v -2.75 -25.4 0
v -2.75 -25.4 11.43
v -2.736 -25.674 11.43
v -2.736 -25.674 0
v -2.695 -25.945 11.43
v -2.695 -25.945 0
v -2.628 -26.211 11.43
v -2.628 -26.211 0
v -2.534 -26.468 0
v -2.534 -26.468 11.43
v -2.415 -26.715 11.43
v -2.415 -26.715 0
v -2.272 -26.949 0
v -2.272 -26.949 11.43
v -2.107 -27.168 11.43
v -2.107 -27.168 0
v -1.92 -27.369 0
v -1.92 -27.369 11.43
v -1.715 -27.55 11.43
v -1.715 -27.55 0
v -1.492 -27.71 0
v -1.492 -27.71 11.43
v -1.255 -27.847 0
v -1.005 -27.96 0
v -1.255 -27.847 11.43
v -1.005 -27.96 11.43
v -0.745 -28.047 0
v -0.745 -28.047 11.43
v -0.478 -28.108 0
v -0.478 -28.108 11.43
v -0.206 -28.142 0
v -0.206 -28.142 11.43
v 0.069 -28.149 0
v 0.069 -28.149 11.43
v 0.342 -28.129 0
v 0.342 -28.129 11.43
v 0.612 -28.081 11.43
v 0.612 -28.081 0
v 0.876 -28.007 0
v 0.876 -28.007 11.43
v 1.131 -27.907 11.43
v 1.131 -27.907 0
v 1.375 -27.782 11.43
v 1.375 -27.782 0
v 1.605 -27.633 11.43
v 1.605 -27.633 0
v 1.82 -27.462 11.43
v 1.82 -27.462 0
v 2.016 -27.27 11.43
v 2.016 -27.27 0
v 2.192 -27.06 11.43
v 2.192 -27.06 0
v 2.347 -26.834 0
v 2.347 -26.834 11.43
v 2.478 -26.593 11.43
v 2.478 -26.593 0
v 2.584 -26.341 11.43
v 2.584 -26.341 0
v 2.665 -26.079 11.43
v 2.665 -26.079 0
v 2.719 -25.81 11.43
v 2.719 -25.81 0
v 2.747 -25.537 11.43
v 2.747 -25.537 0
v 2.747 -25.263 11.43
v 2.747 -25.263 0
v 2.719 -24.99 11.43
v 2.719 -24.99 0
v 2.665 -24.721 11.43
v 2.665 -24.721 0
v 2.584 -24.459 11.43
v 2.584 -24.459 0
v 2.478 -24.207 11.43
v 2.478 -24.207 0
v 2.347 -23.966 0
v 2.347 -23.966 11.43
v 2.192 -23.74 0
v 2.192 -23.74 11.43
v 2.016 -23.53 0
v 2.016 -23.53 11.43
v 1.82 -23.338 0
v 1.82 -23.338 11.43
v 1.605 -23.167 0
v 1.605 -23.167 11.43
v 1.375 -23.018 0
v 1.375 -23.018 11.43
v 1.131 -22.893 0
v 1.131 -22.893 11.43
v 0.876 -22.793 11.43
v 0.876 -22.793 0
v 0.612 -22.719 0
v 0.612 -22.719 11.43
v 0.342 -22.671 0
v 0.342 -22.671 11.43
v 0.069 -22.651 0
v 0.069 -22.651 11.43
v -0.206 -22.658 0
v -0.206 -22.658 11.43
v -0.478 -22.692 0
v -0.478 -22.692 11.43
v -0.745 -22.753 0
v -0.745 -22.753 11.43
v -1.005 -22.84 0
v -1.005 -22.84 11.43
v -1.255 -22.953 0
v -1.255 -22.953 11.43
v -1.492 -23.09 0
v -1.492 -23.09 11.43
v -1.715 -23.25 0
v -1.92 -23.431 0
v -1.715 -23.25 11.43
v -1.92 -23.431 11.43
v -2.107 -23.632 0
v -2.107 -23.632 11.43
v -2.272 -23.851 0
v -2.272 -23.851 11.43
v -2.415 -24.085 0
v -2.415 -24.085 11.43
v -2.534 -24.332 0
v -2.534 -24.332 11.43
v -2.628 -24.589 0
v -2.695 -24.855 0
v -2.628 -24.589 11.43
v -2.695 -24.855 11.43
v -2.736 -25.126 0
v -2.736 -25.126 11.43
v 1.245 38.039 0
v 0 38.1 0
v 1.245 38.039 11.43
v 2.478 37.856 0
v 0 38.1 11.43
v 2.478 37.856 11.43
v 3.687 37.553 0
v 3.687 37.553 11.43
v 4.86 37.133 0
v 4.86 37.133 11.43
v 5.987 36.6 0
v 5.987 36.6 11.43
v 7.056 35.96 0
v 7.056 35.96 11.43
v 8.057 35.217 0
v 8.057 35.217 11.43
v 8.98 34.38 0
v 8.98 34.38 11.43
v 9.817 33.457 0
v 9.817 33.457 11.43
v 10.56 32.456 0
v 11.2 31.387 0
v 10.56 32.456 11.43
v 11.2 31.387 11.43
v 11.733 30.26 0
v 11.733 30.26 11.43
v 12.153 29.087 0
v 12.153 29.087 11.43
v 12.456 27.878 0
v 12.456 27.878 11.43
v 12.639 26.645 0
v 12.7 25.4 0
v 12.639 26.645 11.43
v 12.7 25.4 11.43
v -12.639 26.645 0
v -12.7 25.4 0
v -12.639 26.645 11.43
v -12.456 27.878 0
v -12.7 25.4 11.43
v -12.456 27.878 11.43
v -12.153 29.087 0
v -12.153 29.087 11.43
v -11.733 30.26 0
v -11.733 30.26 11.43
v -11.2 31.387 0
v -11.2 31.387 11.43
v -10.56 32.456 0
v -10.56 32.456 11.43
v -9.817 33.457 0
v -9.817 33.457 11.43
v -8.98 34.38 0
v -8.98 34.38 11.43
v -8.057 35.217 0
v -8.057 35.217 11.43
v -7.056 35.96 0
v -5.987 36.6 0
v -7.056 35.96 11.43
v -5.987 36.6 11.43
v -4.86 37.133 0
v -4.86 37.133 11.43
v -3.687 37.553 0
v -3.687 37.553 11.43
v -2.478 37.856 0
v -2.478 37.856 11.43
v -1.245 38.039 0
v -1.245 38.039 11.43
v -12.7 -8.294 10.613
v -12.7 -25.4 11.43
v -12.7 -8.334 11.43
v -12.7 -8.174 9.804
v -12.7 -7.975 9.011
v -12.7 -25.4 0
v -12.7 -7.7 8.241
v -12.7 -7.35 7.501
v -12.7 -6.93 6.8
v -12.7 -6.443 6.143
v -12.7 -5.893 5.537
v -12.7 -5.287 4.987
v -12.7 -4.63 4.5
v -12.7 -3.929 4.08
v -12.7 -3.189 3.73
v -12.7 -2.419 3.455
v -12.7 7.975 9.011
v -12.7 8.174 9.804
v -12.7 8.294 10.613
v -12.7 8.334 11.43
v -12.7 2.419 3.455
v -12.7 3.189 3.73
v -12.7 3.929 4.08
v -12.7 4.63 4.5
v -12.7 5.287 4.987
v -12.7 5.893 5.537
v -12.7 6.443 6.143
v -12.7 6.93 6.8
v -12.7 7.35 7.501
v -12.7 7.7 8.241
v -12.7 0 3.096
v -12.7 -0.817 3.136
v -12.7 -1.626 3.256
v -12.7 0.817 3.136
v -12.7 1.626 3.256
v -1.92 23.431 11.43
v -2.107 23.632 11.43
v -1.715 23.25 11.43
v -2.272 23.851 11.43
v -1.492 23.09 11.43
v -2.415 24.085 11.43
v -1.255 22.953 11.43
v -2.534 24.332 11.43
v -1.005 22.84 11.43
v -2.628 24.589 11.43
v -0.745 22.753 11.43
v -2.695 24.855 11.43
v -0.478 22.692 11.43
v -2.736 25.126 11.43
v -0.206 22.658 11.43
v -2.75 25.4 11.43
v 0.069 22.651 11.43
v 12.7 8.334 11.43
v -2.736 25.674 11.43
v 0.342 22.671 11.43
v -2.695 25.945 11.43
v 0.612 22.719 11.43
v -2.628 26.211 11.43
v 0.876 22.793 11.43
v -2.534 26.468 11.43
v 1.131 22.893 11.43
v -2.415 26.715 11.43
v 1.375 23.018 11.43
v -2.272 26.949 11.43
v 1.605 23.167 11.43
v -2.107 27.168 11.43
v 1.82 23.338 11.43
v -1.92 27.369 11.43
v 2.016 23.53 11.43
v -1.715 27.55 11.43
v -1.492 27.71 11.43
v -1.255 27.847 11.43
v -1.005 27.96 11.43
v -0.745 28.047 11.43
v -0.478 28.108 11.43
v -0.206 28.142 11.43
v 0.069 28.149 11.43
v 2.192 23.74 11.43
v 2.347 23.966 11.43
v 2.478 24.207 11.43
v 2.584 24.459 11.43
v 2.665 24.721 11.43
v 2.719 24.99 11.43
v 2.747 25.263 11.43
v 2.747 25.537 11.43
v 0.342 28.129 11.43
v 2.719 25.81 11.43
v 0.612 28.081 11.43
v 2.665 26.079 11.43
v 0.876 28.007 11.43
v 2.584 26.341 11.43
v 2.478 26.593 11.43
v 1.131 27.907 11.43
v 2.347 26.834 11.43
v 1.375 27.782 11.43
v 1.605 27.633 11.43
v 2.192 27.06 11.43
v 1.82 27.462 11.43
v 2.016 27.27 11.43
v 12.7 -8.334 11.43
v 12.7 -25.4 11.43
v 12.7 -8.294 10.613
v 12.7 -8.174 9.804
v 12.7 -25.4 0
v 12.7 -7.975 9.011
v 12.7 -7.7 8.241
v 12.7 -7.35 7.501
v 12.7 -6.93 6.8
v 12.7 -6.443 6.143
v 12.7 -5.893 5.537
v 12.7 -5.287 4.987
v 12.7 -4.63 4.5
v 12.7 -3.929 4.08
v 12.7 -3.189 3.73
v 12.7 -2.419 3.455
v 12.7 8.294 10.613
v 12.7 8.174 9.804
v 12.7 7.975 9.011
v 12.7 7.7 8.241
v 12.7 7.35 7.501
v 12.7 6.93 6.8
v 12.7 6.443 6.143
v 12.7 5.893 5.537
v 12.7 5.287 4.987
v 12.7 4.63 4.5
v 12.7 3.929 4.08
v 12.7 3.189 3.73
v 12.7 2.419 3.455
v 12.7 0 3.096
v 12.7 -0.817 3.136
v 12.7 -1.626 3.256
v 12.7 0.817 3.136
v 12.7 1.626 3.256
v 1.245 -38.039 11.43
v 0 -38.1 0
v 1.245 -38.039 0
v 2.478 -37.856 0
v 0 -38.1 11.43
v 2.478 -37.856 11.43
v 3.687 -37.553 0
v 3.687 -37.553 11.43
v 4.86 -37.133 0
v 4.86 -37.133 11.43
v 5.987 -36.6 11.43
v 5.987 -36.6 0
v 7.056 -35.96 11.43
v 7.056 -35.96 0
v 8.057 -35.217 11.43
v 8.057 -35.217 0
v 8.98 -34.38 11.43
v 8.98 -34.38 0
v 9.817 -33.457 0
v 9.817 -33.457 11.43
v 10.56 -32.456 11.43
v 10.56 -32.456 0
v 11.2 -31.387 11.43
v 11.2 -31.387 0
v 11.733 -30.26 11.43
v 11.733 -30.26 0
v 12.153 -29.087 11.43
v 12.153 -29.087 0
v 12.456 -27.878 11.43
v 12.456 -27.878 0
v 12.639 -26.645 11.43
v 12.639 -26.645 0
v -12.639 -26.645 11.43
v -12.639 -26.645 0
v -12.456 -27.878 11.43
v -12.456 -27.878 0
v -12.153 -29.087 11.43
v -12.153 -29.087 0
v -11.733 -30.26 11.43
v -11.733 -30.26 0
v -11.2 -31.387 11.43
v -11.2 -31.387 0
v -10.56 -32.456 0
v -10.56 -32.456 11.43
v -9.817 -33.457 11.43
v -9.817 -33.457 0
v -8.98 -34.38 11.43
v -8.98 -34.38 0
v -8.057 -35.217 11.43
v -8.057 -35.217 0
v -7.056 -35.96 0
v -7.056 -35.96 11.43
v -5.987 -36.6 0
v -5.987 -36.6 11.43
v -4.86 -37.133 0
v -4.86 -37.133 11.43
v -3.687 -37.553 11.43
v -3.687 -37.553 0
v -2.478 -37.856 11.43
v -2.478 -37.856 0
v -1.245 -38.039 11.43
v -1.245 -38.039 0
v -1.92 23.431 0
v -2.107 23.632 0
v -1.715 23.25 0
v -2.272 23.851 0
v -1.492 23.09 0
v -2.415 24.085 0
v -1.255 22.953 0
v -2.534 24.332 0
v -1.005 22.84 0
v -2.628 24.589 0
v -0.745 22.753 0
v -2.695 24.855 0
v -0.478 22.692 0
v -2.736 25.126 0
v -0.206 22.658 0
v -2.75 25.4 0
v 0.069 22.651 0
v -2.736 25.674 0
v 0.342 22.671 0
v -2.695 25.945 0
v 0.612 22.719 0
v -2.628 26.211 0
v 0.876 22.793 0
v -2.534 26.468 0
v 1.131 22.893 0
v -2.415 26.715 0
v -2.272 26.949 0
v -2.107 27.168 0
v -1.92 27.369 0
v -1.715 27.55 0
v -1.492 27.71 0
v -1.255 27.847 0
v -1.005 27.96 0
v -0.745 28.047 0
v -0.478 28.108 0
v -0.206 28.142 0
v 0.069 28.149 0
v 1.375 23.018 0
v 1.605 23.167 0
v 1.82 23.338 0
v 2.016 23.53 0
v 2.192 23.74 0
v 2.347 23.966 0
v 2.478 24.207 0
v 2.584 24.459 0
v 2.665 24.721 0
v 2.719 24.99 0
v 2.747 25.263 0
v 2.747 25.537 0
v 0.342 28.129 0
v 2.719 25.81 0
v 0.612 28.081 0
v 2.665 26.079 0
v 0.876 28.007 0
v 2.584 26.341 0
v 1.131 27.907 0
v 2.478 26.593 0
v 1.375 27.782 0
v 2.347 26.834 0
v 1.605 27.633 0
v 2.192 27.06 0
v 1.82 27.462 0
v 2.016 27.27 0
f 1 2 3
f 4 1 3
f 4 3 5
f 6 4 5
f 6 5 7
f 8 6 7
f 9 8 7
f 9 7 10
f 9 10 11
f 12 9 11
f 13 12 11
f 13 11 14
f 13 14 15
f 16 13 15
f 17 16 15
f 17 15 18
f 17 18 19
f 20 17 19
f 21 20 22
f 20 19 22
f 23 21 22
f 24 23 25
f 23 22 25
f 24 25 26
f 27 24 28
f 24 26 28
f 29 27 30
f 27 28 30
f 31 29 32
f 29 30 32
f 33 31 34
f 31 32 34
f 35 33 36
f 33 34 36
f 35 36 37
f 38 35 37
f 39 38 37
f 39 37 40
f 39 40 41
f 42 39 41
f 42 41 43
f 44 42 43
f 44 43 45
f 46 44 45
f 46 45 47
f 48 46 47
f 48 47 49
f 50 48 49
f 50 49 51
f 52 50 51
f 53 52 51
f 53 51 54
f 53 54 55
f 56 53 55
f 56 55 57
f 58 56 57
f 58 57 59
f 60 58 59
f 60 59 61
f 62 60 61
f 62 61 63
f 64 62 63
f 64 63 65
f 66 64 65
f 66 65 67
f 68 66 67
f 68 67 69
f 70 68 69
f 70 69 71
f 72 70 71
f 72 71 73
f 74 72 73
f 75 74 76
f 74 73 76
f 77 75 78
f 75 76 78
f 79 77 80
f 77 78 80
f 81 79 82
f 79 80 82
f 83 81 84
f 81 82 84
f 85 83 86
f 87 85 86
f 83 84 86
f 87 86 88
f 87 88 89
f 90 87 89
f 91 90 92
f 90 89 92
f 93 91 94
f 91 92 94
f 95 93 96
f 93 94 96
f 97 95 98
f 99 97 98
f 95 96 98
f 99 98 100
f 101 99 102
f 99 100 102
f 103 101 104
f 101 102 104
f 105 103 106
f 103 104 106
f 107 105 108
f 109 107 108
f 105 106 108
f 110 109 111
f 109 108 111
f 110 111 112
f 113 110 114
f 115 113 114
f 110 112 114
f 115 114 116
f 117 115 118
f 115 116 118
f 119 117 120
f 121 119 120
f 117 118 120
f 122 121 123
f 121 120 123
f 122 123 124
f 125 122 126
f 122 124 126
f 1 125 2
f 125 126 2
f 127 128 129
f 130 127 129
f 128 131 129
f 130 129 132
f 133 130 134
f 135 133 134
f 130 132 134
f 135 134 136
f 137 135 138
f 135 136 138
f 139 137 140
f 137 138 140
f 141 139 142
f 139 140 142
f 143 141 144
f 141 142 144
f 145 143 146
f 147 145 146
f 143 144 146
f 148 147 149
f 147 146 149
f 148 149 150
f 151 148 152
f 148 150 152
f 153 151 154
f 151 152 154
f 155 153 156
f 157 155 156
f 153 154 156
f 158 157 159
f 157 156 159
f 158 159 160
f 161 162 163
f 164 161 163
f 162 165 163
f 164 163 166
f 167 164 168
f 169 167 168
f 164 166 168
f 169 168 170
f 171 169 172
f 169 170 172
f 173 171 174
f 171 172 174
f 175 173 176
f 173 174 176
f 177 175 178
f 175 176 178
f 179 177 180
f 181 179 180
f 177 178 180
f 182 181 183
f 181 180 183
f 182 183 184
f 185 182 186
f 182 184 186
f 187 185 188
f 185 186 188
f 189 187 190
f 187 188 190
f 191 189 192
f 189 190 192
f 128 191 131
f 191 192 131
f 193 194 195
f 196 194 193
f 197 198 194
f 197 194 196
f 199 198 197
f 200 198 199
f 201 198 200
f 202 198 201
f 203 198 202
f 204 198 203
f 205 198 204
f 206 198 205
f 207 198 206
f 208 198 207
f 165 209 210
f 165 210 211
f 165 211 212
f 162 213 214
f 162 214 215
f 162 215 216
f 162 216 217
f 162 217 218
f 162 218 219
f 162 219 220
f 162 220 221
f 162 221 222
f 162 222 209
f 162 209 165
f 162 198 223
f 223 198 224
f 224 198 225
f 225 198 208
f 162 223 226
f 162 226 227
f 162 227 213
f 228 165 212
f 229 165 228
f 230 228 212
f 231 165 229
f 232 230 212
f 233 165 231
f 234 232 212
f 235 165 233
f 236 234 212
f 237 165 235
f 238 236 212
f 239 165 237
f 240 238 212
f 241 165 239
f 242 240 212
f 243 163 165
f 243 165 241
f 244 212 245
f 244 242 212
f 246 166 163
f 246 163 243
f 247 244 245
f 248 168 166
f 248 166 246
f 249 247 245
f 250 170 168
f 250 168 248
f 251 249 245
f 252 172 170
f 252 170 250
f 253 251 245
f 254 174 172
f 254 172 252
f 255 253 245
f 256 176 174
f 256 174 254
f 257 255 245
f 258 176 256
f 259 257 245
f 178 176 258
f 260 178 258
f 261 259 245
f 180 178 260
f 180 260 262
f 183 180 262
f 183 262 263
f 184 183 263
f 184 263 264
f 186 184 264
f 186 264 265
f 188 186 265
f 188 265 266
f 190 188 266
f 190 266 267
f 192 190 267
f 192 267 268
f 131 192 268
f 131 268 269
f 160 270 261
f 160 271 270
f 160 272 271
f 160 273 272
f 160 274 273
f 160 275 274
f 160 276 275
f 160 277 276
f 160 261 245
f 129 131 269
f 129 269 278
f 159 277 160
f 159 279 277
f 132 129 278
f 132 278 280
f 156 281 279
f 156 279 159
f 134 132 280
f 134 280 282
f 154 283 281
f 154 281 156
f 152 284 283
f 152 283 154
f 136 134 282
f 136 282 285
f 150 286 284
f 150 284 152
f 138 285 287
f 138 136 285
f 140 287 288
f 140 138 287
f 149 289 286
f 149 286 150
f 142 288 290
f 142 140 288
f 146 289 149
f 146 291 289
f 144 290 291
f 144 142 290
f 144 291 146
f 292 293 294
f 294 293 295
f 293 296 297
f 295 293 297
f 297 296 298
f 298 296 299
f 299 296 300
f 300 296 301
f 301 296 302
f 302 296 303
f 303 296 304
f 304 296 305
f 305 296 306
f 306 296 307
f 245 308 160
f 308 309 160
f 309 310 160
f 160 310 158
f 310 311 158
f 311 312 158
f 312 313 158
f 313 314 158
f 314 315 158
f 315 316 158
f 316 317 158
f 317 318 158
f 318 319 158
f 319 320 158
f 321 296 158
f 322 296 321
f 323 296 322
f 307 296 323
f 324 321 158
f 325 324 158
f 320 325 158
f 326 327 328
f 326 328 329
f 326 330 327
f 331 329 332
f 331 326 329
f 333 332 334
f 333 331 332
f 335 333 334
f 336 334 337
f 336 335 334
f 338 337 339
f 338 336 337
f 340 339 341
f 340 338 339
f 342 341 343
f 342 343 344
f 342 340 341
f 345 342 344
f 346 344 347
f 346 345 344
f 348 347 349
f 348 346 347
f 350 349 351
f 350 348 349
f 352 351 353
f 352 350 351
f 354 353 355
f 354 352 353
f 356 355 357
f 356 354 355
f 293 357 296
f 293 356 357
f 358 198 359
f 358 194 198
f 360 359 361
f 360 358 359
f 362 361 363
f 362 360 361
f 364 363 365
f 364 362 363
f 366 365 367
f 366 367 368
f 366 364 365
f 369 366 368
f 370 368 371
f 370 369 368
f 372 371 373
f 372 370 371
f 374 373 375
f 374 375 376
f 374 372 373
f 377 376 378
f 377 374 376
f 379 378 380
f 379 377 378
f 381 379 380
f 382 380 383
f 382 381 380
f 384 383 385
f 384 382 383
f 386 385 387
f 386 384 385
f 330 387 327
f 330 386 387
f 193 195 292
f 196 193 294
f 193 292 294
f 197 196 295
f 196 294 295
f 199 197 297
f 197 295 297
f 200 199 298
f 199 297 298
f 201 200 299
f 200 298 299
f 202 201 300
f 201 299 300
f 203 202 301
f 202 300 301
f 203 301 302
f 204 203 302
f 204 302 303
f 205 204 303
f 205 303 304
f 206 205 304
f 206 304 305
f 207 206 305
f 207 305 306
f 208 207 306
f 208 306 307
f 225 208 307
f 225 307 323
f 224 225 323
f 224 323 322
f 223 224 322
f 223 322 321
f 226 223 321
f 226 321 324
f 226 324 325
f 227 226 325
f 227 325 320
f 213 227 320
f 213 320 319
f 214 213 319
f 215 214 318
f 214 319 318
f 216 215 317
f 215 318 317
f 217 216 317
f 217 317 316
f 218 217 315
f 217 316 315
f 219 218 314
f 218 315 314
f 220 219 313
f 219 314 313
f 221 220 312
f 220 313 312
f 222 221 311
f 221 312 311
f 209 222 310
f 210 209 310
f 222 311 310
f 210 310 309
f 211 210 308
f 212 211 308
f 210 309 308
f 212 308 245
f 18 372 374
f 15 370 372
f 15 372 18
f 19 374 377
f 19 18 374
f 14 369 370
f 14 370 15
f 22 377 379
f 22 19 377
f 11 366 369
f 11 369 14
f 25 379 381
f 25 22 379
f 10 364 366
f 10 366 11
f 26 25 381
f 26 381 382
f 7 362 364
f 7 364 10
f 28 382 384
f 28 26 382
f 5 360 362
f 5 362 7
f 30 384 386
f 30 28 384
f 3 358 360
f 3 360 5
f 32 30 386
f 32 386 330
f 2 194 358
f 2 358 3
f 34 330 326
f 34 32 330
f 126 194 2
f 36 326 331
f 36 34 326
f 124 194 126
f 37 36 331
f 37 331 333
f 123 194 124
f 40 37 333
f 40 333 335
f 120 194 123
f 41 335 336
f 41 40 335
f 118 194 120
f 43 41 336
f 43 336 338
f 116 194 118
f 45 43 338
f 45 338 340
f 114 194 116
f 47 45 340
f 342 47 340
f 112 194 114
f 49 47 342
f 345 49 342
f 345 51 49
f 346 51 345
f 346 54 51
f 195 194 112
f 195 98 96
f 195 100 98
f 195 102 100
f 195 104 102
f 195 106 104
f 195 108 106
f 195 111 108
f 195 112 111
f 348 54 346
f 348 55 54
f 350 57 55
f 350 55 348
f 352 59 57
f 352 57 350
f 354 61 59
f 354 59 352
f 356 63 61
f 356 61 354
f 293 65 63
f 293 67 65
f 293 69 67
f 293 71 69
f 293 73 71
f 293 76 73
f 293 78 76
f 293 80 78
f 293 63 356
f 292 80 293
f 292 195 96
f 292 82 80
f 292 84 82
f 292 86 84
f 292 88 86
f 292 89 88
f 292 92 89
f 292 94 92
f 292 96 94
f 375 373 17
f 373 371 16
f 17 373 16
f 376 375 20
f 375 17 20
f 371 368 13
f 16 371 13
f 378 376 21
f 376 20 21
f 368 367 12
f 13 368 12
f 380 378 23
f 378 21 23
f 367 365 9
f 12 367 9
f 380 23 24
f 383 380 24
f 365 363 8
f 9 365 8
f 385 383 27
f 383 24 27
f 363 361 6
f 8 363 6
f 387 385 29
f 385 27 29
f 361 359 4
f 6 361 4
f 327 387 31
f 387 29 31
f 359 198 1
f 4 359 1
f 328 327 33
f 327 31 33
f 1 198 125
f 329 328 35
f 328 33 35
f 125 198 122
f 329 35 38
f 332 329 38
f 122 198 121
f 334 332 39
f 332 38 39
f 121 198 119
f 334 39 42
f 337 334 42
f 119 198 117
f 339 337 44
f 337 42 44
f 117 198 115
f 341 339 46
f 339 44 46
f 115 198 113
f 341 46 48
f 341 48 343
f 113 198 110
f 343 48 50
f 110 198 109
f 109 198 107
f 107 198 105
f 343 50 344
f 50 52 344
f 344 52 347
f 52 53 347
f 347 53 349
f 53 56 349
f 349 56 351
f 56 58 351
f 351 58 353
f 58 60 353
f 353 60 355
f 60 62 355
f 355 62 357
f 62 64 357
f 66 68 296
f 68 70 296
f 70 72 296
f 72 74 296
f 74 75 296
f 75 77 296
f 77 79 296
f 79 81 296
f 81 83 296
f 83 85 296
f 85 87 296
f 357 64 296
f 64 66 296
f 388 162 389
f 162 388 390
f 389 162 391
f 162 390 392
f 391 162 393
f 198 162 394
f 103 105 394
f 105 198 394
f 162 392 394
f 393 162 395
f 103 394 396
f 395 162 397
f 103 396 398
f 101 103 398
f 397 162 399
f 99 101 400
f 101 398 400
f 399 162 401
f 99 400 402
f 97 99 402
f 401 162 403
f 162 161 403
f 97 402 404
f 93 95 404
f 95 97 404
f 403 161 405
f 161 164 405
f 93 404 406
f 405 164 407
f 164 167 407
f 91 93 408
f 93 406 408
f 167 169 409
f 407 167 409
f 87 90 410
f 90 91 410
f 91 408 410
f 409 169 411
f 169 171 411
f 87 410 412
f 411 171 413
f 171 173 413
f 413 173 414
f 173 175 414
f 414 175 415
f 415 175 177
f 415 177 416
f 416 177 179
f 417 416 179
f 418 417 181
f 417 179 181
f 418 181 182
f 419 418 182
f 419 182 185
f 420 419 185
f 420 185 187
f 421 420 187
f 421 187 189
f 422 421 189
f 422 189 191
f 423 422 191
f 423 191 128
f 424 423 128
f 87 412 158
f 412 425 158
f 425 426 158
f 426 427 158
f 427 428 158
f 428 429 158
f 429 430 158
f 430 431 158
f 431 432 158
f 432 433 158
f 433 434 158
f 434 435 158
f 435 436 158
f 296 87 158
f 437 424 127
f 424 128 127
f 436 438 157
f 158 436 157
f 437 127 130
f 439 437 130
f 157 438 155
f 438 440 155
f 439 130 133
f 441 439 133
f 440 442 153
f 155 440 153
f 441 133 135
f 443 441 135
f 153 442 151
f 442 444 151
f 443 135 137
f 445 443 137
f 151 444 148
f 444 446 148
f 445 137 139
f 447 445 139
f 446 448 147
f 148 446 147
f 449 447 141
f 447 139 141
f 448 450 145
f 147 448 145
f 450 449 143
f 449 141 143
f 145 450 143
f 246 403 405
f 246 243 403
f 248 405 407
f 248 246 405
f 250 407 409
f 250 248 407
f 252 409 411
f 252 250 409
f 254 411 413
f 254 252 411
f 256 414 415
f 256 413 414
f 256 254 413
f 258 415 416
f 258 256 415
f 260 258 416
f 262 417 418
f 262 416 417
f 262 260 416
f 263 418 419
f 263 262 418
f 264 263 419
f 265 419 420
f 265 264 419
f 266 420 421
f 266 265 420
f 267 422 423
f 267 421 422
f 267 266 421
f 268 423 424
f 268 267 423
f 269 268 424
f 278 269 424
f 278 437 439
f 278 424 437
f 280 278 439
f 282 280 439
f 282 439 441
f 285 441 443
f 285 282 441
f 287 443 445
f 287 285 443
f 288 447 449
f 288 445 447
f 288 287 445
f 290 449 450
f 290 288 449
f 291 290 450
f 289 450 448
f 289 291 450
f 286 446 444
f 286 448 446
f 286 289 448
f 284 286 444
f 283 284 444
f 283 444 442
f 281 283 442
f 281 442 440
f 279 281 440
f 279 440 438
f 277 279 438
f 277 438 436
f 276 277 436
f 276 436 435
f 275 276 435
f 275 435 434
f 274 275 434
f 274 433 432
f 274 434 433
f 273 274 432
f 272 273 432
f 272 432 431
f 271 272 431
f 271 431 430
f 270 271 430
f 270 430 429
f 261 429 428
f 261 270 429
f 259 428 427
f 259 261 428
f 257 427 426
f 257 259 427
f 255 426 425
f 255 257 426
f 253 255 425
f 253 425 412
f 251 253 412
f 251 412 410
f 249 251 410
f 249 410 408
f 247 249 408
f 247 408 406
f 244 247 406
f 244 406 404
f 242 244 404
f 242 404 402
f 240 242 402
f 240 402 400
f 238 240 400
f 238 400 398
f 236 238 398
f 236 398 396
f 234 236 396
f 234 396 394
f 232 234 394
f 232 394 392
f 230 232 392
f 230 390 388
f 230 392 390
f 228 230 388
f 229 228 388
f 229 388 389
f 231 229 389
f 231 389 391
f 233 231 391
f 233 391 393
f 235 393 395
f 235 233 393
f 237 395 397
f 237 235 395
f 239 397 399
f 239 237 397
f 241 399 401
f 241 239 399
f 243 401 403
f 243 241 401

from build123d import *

# Parameters (mm, degrees)
F0_W          = 25.4
F0_H          = 76.2
F1_DEPTH      = 11.43
F3_DEPTH      = 12.701
F3_DEPTH_BACK = 12.701
F5_D          = 5.5
F6_R          = 12.69999


# Not quite as in the source:
# - a fillet or chamfer is up to 0.001 mm smaller than in the source, because OpenCascade refuses the exact size
# - a pattern or mirror of a feature is missing from the dataset's text; its kind, count and spacing are read off the source's solid


with BuildPart() as f1:
    # F0 (on Top) → F1 (new body)
    with BuildSketch(Plane.XY):
        Rectangle(F0_W, F0_H)
    extrude(amount=F1_DEPTH)

    # F2 (on Right) → F3 (cut, two sides)
    with BuildSketch(Plane.YZ) as f3_sk:
        with BuildLine():
            Line((8.334375, 11.43), (-8.334375, 11.43))
            ThreePointArc((-8.334375, 11.43), (0, 3.095625), (8.334375, 11.43))
        make_face()
    extrude(amount=-F3_DEPTH, mode=Mode.SUBTRACT)
    extrude(f3_sk.sketch, amount=F3_DEPTH_BACK, mode=Mode.SUBTRACT)

    # F5 (through all)
    with Locations(Plane(origin=(0, 0, 0), x_dir=(1, 0, 0), z_dir=(0, 0, -1))):
        with Locations((0, 25.4)):
            f5 = Hole(F5_D / 2)

    # F5_copies: F5 across plane
    add(f5.mirror(Plane.ZX), mode=Mode.SUBTRACT)

    # F6 (radius 12.7 in the source; OpenCascade refuses exactly that, so slightly less here)
    f6_edges = [f1.edges().sort_by_distance(p)[0] for p in [
        (-12.7, -38.1, 5.715),
        (12.7, -38.1, 5.715),
        (-12.7, 38.1, 5.715),
        (12.7, 38.1, 5.715),
    ]]
    fillet(f6_edges, radius=F6_R)


solid = f1.part
